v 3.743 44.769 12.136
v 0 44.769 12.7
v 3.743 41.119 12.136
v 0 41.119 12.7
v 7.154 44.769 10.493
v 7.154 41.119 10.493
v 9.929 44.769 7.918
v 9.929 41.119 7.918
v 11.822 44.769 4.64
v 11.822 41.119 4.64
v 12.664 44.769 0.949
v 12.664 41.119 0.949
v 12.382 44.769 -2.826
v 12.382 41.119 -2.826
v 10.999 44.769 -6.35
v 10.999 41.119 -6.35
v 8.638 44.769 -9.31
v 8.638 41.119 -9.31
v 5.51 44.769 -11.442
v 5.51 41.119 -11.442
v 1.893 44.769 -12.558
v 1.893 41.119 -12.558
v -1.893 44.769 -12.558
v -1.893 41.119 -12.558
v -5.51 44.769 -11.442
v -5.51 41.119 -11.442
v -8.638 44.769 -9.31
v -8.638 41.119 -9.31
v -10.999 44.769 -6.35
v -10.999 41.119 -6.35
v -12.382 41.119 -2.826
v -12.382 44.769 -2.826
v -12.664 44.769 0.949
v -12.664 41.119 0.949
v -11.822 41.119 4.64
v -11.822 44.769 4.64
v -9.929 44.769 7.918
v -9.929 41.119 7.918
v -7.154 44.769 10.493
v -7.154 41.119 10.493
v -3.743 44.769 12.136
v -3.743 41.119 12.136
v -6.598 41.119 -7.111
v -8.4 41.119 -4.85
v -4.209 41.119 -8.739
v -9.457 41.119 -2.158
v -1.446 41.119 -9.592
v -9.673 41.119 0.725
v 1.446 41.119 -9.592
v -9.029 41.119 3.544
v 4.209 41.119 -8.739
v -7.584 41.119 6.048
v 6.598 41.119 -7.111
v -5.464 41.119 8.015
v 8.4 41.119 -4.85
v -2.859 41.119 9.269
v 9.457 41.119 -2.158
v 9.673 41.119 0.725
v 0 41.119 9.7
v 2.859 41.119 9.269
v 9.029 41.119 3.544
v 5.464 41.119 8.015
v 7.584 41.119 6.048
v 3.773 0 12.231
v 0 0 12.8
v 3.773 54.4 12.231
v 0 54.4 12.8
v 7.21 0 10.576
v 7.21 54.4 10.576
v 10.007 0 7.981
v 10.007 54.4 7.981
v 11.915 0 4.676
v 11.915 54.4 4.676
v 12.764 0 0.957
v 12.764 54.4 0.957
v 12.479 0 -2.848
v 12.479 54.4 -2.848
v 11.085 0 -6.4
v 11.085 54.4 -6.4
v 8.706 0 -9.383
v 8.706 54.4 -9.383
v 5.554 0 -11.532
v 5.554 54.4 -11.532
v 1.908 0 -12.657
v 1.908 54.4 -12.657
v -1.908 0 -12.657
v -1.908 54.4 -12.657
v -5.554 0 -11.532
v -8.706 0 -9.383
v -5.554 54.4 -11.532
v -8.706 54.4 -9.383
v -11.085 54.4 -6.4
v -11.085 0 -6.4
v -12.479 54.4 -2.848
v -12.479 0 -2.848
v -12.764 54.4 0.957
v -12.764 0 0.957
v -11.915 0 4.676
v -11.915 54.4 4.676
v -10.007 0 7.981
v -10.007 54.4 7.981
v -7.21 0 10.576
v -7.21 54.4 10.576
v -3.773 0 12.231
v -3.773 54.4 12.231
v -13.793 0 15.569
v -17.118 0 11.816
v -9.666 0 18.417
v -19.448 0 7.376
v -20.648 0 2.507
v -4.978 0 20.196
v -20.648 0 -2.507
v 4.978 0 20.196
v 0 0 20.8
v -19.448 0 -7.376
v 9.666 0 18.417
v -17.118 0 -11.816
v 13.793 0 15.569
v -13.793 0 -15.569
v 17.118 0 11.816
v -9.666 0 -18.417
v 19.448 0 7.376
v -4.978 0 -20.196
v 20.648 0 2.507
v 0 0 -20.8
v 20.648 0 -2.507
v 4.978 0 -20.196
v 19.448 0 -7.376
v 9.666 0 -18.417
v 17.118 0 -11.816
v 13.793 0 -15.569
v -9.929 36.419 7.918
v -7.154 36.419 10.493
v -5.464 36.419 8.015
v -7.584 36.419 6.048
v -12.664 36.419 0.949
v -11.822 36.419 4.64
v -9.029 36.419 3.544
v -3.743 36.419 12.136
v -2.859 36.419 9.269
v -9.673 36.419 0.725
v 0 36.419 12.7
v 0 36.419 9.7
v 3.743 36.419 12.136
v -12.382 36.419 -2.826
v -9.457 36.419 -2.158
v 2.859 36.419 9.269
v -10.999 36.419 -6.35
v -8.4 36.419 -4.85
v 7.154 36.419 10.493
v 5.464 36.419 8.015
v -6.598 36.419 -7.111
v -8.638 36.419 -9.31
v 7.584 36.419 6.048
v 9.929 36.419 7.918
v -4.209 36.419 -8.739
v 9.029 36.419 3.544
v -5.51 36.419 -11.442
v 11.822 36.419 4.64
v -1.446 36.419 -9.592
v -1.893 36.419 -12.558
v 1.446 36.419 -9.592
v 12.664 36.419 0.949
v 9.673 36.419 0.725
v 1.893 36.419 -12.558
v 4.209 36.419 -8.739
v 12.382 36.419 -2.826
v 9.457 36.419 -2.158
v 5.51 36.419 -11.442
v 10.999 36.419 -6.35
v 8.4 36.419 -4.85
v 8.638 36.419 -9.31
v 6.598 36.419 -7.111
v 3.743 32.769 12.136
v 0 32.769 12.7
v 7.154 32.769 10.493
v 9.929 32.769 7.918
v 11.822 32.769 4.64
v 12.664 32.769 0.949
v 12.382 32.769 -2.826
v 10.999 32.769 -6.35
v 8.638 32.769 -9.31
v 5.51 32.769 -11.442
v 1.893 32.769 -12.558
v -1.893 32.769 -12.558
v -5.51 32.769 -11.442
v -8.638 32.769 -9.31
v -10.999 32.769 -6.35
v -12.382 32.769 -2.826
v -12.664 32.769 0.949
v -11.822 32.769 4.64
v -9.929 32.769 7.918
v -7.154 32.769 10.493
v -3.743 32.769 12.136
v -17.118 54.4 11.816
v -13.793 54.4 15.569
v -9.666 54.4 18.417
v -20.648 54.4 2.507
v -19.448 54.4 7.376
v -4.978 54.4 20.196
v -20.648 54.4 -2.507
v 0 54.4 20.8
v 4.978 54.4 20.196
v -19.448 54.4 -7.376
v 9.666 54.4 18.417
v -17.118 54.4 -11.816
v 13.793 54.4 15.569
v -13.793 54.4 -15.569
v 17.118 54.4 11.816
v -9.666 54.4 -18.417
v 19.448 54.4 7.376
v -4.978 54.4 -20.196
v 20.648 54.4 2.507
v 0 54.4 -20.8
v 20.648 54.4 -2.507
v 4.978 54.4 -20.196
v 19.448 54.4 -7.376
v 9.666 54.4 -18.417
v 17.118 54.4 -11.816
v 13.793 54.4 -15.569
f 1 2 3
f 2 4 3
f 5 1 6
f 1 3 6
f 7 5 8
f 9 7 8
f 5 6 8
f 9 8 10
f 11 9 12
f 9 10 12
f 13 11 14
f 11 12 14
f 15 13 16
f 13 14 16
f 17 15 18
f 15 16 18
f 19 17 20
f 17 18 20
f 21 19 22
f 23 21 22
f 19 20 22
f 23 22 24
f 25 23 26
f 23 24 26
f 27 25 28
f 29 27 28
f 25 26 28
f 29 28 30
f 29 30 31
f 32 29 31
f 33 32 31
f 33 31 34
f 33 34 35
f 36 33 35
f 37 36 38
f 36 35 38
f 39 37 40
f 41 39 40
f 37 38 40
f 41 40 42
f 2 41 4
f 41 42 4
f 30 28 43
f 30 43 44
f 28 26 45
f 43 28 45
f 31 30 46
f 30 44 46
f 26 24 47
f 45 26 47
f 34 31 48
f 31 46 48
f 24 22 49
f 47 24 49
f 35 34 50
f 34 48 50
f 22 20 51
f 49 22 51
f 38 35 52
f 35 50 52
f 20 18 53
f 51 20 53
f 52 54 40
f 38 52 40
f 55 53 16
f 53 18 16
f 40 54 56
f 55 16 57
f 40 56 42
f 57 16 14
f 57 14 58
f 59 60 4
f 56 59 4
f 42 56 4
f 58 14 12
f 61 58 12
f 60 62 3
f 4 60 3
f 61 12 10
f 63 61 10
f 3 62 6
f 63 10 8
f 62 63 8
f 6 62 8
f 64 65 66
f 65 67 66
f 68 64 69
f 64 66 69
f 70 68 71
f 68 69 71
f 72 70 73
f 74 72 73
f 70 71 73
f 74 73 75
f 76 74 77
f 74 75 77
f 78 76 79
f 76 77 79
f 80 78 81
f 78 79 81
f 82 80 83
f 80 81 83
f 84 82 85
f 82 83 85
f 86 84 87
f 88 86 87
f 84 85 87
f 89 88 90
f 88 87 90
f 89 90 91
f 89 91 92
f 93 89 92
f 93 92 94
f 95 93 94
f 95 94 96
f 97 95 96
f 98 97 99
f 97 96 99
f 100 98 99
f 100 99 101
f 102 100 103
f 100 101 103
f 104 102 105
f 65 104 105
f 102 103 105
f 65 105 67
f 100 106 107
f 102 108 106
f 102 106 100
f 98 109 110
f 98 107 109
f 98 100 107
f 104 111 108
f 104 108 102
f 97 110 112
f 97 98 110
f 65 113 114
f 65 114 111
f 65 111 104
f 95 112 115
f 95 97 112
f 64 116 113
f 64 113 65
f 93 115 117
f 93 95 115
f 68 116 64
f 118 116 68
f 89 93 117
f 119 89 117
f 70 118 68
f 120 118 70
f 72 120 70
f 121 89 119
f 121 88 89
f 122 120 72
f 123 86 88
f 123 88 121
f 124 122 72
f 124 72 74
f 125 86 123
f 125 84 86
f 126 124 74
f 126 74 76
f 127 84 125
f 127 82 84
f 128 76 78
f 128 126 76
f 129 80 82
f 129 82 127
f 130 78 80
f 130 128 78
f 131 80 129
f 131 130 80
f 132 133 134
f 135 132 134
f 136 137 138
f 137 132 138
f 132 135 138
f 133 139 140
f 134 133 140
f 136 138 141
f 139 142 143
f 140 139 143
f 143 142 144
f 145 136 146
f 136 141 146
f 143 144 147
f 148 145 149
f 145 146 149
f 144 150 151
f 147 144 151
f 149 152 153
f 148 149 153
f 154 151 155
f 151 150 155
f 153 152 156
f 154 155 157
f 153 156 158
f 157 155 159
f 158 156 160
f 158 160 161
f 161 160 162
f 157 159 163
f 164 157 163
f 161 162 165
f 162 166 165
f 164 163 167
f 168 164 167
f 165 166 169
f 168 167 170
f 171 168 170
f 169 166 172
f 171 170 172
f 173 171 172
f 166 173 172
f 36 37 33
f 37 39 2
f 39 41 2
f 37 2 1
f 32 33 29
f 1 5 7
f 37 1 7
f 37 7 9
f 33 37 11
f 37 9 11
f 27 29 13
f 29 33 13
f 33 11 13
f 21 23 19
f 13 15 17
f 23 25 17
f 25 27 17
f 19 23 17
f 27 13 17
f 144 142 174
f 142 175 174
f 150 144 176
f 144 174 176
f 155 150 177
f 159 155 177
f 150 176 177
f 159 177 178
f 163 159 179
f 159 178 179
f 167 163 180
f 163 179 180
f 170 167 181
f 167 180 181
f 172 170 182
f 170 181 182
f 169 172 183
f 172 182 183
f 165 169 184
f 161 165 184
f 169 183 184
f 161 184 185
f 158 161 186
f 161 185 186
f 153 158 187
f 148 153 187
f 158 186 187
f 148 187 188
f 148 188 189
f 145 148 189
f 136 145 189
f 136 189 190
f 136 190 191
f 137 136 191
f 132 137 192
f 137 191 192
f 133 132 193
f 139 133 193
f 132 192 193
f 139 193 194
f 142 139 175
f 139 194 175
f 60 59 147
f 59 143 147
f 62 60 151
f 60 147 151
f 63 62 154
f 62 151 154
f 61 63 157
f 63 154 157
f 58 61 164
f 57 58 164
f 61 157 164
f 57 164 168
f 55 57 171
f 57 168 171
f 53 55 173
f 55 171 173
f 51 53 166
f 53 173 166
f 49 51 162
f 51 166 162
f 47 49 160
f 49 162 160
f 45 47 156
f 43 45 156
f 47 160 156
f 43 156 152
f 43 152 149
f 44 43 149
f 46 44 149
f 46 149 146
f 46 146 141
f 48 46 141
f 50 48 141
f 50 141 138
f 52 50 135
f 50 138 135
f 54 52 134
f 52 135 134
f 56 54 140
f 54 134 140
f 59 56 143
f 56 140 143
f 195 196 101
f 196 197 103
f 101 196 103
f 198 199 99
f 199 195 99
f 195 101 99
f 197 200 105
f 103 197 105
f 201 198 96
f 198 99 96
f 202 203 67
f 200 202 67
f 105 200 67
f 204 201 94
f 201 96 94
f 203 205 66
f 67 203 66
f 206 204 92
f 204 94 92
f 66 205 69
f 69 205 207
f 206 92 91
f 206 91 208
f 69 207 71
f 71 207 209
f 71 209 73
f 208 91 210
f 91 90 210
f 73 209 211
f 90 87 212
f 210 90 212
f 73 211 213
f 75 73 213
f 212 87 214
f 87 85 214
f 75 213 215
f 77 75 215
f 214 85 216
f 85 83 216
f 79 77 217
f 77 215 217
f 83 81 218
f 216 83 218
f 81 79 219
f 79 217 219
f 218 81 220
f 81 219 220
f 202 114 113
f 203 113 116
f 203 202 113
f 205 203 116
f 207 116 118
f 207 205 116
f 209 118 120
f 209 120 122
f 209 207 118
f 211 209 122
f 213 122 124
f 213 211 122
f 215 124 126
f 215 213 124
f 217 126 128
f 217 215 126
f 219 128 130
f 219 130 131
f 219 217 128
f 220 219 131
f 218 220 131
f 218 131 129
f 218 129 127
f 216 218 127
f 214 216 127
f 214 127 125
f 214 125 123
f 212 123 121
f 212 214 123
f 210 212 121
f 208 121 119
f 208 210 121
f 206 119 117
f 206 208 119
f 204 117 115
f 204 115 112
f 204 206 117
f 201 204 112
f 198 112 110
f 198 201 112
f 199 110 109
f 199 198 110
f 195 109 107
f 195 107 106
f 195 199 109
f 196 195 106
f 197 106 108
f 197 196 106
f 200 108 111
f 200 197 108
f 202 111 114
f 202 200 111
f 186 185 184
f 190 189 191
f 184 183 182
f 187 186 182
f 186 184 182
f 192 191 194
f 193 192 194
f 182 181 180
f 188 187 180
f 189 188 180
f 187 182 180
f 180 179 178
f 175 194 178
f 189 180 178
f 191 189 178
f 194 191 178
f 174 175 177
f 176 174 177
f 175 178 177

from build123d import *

# Parameters (mm, degrees)
F0_W = 54.4
F0_H = 8


with BuildPart() as f1:
    # F0 (on Right) → F1 (revolve)
    with BuildSketch(Plane.YZ):
        Polygon((32.768668, 12.7), (32.768668, 0), (44.768668, 0), (44.768668, 12.7), (41.118668, 12.7), (41.118668, 9.7), (36.418668, 9.7), (36.418668, 12.7), align=None)
    revolve(axis=Axis((0, 23.731925, 0), (0, 1, 0)))


with BuildPart() as f2:
    # F0 (on Right) → F2 (revolve)
    with BuildSketch(Plane.YZ):
        with Locations((27.2, 16.8)):
            Rectangle(F0_W, F0_H)
    revolve(axis=Axis((0, 23.731925, 0), (0, 1, 0)))


solid = Compound([f1.part, f2.part])
